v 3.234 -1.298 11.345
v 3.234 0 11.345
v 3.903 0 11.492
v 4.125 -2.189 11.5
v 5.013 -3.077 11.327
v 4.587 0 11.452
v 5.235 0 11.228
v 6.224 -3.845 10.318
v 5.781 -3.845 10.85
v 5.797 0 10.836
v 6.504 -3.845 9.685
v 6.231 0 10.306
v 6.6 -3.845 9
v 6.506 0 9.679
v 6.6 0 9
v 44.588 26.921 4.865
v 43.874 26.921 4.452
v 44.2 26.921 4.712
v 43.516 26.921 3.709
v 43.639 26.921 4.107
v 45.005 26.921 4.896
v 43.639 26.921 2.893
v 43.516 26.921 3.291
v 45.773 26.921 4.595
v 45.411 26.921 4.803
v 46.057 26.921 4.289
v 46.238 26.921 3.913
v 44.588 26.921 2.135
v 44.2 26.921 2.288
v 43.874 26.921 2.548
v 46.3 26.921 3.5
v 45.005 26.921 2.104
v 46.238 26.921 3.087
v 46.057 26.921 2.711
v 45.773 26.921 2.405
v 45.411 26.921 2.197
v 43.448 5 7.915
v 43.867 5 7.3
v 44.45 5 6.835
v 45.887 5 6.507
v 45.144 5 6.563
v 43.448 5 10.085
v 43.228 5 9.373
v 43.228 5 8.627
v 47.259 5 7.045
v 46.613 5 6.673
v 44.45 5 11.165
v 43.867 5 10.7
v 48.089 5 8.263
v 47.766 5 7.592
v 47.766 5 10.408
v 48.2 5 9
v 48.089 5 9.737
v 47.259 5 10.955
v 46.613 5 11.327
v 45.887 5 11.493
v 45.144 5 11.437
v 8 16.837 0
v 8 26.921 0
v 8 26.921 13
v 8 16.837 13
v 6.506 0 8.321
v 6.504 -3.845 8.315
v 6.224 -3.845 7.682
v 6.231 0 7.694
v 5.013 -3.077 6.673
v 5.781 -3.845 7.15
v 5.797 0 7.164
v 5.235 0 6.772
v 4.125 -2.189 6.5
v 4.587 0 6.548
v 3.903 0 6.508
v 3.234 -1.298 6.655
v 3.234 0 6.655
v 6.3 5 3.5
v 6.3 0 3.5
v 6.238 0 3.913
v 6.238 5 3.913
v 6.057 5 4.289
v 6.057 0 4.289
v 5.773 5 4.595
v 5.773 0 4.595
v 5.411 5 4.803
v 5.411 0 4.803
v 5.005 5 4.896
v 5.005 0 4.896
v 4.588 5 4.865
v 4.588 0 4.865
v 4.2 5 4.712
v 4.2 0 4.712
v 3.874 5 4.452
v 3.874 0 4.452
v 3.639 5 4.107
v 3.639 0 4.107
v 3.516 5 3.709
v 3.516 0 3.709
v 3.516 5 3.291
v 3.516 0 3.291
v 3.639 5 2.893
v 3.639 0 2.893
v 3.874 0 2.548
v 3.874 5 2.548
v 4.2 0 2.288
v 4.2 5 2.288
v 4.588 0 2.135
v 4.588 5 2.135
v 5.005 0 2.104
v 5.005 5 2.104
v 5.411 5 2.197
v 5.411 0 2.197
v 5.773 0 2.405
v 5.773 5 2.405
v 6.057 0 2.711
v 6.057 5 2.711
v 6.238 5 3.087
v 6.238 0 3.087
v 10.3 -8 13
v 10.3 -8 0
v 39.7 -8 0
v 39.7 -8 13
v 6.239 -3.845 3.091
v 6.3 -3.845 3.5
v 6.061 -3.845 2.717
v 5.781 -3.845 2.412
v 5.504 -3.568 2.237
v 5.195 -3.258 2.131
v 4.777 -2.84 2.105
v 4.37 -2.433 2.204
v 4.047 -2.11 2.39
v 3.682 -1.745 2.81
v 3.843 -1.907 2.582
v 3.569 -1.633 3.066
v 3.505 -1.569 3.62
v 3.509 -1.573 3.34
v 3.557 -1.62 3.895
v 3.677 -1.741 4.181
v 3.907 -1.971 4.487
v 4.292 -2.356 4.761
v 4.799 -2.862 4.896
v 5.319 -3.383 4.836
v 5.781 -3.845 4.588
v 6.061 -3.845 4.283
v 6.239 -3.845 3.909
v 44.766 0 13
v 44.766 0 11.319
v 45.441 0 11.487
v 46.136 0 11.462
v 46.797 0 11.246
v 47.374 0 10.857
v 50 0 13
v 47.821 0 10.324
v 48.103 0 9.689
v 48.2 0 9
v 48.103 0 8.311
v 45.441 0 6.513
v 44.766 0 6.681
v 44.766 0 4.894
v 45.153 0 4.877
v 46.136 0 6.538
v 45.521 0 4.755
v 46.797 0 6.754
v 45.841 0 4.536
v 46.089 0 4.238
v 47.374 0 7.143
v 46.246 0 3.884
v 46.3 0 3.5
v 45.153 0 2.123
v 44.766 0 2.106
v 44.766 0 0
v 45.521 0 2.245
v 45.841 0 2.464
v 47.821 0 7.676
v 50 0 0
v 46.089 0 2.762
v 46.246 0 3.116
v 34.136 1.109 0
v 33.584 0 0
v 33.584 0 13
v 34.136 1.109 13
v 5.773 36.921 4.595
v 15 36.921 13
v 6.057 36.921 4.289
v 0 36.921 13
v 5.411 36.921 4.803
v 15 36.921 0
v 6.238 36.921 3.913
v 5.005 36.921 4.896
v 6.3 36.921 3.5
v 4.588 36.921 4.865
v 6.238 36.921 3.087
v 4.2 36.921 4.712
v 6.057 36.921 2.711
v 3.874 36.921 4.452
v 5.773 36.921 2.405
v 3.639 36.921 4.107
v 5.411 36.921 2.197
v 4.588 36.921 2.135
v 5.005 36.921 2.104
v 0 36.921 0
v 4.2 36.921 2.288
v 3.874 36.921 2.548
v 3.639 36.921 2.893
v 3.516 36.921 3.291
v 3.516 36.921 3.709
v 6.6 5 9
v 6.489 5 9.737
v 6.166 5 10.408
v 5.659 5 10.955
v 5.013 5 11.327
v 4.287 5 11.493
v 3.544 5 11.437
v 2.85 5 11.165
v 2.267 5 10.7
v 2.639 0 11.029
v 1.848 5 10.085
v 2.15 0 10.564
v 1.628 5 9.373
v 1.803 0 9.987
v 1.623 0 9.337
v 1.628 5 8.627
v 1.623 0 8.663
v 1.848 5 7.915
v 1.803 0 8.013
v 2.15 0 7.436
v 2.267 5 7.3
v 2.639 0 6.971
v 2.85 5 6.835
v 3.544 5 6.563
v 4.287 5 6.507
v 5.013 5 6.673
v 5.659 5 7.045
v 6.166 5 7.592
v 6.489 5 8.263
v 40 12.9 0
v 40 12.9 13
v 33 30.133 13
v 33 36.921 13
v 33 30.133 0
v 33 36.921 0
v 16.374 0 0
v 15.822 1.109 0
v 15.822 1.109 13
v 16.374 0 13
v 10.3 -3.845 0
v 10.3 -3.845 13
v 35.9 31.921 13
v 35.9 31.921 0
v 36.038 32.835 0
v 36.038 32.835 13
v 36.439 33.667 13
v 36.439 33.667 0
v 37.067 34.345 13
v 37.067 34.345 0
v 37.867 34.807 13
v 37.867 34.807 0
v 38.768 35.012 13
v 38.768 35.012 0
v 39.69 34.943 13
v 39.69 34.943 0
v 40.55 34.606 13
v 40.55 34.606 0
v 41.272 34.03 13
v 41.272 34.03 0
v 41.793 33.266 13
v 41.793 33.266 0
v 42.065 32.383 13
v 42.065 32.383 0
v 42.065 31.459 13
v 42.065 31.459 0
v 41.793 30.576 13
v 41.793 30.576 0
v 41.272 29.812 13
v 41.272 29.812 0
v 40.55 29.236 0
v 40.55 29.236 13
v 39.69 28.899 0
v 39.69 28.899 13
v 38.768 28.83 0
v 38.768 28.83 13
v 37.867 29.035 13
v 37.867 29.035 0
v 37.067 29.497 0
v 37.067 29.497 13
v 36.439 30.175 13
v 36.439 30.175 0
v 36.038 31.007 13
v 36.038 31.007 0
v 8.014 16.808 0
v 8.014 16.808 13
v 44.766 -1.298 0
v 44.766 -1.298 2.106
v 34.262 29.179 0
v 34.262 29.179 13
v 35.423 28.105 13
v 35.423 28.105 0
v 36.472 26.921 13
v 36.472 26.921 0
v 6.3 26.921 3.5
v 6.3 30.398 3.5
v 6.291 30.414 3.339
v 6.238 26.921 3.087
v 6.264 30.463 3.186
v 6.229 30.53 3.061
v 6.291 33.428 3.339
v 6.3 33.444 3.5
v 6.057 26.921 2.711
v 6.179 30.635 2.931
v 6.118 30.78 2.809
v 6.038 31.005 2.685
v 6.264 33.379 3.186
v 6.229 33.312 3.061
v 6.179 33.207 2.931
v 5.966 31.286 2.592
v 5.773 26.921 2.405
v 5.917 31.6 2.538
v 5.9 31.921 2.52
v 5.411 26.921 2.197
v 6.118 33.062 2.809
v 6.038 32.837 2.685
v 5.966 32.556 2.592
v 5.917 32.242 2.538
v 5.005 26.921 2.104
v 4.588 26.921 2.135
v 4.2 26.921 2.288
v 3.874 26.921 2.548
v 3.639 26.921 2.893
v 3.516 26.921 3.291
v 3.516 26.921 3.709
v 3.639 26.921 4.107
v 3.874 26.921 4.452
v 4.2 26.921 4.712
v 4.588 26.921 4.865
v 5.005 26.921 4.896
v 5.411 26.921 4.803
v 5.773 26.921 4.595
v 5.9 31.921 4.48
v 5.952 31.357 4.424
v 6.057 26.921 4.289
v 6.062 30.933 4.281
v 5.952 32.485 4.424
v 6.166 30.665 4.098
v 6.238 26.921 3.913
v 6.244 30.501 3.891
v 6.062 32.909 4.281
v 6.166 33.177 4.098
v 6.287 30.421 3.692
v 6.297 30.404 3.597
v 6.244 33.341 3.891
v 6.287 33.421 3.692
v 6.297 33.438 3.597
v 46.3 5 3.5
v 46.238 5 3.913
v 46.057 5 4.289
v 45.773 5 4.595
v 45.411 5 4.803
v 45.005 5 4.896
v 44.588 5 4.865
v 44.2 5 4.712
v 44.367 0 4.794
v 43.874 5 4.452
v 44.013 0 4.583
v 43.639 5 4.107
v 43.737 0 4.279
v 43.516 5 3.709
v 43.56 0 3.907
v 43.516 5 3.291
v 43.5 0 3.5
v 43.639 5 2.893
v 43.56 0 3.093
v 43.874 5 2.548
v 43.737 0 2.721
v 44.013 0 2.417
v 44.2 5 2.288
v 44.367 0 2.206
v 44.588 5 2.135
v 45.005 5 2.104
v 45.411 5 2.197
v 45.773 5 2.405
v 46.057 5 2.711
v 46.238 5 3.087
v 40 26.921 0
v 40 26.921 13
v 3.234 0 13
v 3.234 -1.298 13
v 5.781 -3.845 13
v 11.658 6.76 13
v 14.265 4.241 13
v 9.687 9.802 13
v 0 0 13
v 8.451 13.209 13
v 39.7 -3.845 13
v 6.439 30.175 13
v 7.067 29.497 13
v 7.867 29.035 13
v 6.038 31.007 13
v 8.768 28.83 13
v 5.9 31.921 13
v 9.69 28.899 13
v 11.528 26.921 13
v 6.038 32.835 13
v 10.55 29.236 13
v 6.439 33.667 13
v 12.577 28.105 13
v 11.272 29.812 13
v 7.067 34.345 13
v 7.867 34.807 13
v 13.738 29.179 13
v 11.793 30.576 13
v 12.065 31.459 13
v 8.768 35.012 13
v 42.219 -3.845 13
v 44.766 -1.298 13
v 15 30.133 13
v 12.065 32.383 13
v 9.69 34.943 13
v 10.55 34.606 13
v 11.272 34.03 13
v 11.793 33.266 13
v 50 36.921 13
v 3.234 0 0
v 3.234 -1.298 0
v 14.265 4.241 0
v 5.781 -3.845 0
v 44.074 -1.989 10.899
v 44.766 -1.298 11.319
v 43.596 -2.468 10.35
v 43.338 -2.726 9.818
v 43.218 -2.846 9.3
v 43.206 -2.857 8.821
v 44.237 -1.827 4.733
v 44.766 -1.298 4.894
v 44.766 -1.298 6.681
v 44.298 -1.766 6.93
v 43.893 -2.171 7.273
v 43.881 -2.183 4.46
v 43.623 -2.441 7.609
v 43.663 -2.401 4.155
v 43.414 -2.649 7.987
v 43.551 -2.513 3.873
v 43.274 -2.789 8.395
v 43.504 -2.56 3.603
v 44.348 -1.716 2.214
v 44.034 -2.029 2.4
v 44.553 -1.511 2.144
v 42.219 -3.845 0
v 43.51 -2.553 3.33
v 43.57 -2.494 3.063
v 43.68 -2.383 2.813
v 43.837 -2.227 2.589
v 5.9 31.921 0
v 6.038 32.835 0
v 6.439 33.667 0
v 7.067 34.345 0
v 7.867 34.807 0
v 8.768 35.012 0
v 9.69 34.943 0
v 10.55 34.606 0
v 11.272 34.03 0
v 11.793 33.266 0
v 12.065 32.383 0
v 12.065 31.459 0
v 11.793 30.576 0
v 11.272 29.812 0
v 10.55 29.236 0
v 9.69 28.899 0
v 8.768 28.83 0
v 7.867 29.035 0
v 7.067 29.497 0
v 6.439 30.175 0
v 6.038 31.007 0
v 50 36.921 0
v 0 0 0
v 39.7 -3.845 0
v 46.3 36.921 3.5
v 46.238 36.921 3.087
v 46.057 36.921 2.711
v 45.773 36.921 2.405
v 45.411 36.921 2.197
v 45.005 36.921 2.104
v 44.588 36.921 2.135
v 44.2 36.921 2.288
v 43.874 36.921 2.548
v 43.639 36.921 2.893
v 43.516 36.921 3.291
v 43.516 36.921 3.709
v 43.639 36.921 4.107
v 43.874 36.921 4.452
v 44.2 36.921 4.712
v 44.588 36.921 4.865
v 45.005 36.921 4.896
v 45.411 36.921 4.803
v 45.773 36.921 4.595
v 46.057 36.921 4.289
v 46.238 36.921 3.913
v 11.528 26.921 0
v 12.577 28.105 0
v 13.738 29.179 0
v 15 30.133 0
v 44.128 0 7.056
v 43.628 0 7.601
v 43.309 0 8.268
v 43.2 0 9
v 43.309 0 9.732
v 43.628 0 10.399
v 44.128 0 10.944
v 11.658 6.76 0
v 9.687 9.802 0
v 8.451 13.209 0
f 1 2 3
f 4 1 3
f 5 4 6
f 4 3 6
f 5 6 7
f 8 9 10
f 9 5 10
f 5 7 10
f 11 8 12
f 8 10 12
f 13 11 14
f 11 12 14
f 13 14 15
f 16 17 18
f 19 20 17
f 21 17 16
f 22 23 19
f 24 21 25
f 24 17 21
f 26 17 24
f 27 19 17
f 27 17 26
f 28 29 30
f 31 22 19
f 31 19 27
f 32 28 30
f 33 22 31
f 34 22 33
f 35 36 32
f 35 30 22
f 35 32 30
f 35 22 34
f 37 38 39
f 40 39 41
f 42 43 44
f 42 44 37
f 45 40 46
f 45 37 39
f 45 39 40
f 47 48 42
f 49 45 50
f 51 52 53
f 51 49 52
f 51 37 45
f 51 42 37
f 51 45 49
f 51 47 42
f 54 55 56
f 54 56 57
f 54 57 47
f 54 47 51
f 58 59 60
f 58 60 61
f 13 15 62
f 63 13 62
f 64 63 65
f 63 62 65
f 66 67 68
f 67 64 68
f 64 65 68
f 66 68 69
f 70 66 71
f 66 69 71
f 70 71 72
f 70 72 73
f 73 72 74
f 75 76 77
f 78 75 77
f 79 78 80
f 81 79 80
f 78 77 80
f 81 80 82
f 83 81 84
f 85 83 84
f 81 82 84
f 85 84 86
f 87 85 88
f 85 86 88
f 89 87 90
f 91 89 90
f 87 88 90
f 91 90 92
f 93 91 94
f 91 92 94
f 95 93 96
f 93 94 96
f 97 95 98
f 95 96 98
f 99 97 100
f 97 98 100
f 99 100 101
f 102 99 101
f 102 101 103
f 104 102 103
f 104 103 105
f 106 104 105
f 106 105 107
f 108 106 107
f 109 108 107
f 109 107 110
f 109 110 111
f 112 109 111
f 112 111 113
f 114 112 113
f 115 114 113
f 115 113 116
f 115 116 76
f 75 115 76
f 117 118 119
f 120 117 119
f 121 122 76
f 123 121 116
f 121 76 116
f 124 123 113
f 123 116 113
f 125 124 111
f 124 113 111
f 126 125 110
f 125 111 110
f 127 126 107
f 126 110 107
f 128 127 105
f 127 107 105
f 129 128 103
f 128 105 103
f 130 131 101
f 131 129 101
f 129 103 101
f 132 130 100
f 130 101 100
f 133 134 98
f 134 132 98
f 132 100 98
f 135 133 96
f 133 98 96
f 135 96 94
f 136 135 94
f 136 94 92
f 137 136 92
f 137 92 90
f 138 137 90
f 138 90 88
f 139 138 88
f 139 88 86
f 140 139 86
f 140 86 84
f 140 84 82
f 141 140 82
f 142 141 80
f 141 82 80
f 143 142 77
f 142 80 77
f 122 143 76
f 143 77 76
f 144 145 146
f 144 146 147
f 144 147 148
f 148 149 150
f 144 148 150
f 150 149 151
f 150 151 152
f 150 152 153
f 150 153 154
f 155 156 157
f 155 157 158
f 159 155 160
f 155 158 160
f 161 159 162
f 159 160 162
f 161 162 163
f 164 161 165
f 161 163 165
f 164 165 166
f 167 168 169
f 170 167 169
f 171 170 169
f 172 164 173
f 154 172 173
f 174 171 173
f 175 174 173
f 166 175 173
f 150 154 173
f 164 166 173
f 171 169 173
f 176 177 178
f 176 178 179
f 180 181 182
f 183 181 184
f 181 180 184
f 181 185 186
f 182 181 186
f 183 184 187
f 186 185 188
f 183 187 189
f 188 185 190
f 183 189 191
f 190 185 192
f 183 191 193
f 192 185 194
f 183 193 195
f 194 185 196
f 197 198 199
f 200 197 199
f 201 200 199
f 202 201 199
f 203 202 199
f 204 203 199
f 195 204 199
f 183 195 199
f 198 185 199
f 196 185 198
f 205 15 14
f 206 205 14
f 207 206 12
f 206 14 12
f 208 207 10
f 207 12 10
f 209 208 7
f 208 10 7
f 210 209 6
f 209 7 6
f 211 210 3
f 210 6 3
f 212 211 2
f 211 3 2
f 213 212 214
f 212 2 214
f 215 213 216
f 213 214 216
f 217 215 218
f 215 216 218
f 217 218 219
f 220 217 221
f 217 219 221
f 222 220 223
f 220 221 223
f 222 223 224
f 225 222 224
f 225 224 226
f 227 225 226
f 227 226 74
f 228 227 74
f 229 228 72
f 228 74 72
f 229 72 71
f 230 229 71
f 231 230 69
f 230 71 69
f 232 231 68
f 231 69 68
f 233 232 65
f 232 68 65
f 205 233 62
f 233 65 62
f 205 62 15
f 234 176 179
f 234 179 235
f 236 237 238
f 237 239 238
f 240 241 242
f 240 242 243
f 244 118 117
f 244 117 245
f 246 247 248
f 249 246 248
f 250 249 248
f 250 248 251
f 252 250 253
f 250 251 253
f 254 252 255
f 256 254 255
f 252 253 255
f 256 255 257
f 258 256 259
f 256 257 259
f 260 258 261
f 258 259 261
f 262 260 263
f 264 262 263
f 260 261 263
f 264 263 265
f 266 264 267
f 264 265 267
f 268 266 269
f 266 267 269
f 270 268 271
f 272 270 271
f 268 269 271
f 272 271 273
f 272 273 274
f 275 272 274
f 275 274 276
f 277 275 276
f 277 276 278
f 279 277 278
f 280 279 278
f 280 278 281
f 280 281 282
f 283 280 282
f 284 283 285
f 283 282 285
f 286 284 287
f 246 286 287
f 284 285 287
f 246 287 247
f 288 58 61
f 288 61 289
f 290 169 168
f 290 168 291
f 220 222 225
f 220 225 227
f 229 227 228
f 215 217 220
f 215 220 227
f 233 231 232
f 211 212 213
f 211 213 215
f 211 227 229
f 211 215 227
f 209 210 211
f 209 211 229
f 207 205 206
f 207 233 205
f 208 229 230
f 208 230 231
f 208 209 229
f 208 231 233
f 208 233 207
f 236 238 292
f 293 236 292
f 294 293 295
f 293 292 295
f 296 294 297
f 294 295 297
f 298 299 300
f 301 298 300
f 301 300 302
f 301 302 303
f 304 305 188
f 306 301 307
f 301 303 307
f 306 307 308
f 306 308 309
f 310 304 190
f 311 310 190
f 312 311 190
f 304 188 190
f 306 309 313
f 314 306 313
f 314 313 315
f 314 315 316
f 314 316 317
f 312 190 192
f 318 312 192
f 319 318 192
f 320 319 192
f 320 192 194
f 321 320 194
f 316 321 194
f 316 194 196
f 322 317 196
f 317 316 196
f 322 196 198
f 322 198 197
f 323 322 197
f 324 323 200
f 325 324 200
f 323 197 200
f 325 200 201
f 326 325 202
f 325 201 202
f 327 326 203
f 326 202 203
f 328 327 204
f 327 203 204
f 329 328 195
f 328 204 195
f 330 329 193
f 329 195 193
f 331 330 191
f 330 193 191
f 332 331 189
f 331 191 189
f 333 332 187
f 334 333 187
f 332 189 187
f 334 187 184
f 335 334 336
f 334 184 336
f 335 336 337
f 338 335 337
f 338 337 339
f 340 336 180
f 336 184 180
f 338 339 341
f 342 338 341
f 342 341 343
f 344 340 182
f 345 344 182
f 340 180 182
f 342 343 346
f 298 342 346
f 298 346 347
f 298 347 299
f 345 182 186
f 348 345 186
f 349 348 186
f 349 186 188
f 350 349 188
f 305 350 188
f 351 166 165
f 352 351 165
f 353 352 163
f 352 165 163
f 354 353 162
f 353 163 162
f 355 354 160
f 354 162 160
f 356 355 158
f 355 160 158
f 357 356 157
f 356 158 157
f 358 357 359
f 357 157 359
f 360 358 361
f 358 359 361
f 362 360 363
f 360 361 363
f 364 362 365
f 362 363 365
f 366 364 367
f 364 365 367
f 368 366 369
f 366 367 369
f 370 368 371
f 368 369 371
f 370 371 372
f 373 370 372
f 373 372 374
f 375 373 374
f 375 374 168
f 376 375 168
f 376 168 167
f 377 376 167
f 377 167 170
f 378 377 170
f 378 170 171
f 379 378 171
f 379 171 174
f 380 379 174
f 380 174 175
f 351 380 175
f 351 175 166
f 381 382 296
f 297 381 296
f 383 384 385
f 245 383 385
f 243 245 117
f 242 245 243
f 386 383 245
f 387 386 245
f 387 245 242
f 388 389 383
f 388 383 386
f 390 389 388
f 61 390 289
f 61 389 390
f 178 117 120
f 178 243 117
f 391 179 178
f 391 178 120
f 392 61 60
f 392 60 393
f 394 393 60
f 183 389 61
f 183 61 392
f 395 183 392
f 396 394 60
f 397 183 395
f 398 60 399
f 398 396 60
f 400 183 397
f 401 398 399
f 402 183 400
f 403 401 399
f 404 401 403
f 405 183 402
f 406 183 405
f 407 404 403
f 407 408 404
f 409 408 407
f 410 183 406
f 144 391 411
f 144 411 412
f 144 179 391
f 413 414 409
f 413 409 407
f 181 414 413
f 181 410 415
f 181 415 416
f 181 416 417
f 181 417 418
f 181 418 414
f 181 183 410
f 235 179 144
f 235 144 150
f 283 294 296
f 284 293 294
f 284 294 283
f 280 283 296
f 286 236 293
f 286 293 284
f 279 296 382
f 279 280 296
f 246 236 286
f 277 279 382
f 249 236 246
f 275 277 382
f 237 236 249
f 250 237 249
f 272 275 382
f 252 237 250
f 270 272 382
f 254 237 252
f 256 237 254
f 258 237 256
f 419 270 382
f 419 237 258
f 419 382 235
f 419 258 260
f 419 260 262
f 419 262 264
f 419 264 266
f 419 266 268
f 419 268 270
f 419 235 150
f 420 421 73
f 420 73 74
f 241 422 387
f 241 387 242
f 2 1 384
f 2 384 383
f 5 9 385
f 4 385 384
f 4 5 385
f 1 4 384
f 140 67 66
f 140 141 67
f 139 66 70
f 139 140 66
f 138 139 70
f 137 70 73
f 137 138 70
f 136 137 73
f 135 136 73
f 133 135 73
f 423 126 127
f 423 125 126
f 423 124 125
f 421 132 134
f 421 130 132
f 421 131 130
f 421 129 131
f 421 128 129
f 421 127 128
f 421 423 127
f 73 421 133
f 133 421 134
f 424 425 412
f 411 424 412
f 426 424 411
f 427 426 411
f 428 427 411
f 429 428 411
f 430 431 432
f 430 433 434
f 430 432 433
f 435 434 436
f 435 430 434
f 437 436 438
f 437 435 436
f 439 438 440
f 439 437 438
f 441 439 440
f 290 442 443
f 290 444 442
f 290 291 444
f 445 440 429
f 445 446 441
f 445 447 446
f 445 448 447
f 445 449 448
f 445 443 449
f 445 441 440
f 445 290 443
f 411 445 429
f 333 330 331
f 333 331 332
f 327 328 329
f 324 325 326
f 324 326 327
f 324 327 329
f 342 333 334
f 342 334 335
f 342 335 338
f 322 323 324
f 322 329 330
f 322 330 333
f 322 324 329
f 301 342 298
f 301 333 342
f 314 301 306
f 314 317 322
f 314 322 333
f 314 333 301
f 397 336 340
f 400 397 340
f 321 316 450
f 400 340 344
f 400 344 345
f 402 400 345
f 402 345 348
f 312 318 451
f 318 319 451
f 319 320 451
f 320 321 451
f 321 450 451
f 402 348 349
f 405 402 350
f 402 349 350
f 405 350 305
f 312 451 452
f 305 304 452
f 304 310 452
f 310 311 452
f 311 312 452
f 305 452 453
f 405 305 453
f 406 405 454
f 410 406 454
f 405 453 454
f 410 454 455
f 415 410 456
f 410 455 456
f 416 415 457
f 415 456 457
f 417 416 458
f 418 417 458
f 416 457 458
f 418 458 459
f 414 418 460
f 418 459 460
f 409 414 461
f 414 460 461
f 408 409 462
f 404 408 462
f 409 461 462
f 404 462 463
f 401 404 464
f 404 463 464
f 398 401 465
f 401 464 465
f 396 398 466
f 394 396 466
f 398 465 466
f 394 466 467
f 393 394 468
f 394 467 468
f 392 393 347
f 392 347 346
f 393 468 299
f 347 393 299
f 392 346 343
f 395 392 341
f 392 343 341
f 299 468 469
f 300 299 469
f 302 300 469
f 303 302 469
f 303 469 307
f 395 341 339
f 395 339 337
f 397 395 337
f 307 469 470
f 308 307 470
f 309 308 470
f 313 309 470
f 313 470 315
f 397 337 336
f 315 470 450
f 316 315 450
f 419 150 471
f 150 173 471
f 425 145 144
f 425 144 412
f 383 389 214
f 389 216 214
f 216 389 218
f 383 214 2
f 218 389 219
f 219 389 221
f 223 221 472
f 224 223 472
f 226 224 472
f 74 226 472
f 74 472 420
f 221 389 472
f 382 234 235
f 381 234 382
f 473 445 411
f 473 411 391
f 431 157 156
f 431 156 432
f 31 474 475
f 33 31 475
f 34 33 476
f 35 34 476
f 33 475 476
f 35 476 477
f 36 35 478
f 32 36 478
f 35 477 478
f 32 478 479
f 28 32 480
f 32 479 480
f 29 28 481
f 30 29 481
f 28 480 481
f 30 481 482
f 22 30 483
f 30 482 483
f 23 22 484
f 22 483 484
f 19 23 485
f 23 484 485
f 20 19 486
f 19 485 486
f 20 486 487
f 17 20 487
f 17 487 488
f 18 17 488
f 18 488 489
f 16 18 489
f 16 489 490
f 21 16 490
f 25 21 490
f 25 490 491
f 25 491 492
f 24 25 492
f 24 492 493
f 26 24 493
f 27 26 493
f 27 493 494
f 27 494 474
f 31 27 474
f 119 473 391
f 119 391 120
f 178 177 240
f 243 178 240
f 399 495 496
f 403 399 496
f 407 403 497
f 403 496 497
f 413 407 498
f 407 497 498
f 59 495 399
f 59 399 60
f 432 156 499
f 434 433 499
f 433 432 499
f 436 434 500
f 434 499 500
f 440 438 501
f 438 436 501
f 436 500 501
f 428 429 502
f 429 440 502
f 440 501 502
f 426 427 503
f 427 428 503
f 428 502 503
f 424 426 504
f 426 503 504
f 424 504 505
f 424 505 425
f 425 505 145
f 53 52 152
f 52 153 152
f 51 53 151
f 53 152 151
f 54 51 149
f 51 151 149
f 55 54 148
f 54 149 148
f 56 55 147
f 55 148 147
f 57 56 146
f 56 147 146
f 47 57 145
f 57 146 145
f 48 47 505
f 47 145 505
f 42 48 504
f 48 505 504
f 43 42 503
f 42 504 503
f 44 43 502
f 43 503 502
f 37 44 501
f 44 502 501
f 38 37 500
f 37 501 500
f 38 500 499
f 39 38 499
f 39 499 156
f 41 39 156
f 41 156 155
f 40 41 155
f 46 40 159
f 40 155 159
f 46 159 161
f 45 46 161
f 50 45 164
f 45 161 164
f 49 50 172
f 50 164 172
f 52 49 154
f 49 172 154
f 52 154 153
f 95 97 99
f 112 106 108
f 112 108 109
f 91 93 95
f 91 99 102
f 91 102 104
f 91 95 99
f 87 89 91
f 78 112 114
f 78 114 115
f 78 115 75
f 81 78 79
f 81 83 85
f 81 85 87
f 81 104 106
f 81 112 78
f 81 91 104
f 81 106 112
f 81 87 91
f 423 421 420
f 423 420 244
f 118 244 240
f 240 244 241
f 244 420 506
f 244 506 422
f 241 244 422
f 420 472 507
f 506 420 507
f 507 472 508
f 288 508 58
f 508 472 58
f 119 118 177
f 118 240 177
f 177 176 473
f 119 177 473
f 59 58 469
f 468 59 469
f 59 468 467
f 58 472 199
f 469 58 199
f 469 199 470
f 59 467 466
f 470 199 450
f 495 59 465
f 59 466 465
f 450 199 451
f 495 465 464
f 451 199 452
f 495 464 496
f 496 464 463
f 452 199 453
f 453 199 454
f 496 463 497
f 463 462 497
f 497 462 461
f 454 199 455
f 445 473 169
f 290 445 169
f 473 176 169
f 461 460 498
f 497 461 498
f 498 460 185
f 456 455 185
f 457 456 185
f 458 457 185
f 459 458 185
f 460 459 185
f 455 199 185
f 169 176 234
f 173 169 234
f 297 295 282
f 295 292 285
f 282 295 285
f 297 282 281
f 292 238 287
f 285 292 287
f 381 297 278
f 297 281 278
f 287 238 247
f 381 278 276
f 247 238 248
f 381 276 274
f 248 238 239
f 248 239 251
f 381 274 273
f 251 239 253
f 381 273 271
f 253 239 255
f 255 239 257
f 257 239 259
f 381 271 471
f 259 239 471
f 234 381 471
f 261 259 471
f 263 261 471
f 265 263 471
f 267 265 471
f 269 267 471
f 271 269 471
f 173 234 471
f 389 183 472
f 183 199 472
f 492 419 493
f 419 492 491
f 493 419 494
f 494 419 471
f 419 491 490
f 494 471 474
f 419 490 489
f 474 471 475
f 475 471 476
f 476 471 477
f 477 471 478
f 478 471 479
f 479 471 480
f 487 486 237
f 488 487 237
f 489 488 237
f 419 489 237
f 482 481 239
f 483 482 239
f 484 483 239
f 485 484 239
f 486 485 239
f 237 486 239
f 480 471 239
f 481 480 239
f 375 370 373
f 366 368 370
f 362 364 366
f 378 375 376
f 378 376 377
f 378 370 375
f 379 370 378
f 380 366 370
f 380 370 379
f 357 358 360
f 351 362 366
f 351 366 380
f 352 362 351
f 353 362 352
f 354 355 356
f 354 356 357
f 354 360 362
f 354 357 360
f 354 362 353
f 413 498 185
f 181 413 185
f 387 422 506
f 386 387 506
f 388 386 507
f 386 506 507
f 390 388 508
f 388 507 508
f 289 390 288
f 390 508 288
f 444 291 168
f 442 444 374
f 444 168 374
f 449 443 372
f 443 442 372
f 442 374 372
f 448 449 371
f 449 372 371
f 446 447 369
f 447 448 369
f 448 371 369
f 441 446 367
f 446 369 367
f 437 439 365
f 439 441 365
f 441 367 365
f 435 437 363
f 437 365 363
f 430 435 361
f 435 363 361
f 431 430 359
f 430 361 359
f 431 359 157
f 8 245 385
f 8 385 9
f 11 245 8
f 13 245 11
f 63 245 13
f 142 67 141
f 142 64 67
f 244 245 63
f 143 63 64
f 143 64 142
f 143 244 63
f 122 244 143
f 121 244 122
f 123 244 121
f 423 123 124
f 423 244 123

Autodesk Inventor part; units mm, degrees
ref_plane "YZ Plane" through (0, 0, 0) normal (1, 0, 0) x (0, 1, 0)
ref_plane "XZ Plane" through (0, 0, 0) normal (0, 1, 0) x (-1, 0, 0)
ref_plane "XY Plane" through (0, 0, 0) normal (0, 0, 1) x (1, 0, 0)
sketch "Sketch1" plane through (0, 0, 0) normal (0, 0, 1) x (1, 0, 0)
  line L0 (0, 0) -> (50, 0)
  line L1 (50, 0) -> (50, 36.921)
  line L2 (50, 36.921) -> (0, 36.921)
  line L3 (0, 36.921) -> (0, 0)
  dimension "d0" = 36.921
  dimension "d1" = 50
extrude "Extrusion1" add sketch "Sketch1" along normal blind 13
sketch "Sketch4" plane through (0, 0, 0) normal (0, 0, -1) x (-1, 0, 0)
  line L0 (-10, -8) -> (-40, -8)
  line L1 (-45.066, 0) -> (-2.934, 0)
  line L2 (-10.3, -8) -> (-10.3, -3.845)
  line L3 (-10.3, -3.845) -> (-5.7813, -3.845)
  line L4 (-5.7813, -3.845) -> (-3.234, -1.2977)
  line L5 (-3.234, -1.2977) -> (-3.234, 0)
  line L6 (-44.766, 0) -> (-44.766, -1.2977)
  line L7 (-44.766, -1.2977) -> (-42.2187, -3.845)
  line L8 (-42.2187, -3.845) -> (-39.7, -3.845)
  line L9 (-39.7, -3.845) -> (-39.7, -8)
  line L10 (0, 0) -> (-2.934, 0)
  line L11 (0, 0) -> (-50, 0) projected
  point P0 (-45.066, -1.422)
  dimension "d27" = 2.934
extrude "Extrusion4" add sketch "Sketch4" against normal blind 13
sketch "Sketch2" plane through (0, 0, 0) normal (0, -1, 0) x (1, 0, 0)
  circle A0 centre (44.9, 3.5) radius 1.4
  circle A1 centre (4.9, 3.5) radius 1.4
  line L0 (50, 0) -> (50, 13) projected
  circle A2 centre (45.7, 9) radius 2.5
  circle A3 centre (4.1, 9) radius 2.5
  line L1 (0, 0) -> (0, 13) projected
  line L2 (0, 13) -> (50, 13) projected
  dimension "d4" = 2.8
  dimension "d5" = 2.8
  dimension "d7" = 40
  dimension "d8" = 5
  dimension "d9" = 5
  dimension "d10" = 5.5
  dimension "d13" = 4.1
  dimension "d14" = 5.5
  dimension "d15" = 4
  dimension "d16" = 4.9
  dimension "d17" = 41.6
  dimension "d20" = 4
extrude "Extrusion2" cut sketch "Sketch2" along normal blind 10 and the other way blind 5
sketch "Sketch7" plane through (0, 0, 0) normal (0, 0, -1) x (-1, 0, 0)
  arc A0 (17, 30.1329) -> (13.5279, 26.921) centre (26, 16.921) ccw
  line L0 (10, 26.921) -> (13.5279, 26.921)
  line L1 (10, 12.8998) -> (10, 26.921)
  line L2 (15.8642, 1.1093) -> (10, 12.8998)
  line L3 (16.416, 0) -> (33.6258, 0)
  line L4 (16.416, 0) -> (15.8642, 1.1093)
  line L5 (34.1776, 1.1093) -> (33.6258, 0)
  line L6 (35.7354, 4.2414) -> (34.1776, 1.1093)
  arc A1 (35.7354, 4.2414) -> (41.9856, 16.8076) centre (26, 16.921) ccw
  line L7 (42, 26.921) -> (42, 16.8366)
  line L8 (38.4721, 26.921) -> (42, 26.921)
  arc A2 (38.4721, 26.921) -> (35, 30.1328) centre (26, 16.921) ccw
  line L9 (35, 36.921) -> (35, 30.1328)
  line L10 (17, 30.1329) -> (17, 36.921)
  circle A3 centre (11, 31.921) radius 3.1
  circle A4 centre (41, 31.921) radius 3.1
  line L11 (42, 16.8366) -> (41.9856, 16.8076)
  line L12 (17, 36.921) -> (35, 36.921)
  line L13 (17, 35.9386) -> (35, 35.9386)
  line L14 (35, 35.9386) -> (35, 37.4386)
  line L15 (35, 37.4386) -> (17, 37.4386)
  line L16 (17, 37.4386) -> (17, 35.9386)
  line L17 (0, 36.921) -> (0, 0) projected
  line L18 (0, 36.921) -> (-15, 36.921)
  line L19 (0, 36.921) -> (15, 36.921) construction
  line L20 (-33, 35.9386) -> (-15, 35.9386)
  line L21 (-33, 36.921) -> (-15, 36.921)
  line L22 (-15, 37.4386) -> (-33, 37.4386)
  line L23 (-33, 37.4386) -> (-33, 35.9386)
  line L24 (-33, 30.1329) -> (-33, 36.921)
  arc A5 (-33, 30.1329) -> (-36.4721, 26.921) centre (-24, 16.921) ccw
  circle A6 centre (-39, 31.921) radius 3.1
  line L25 (-40, 26.921) -> (-36.4721, 26.921)
  line L26 (-40, 12.8998) -> (-40, 26.921)
  line L27 (-34.1358, 1.1093) -> (-40, 12.8998)
  line L28 (-33.584, 0) -> (-16.3742, 0)
  line L29 (-33.584, 0) -> (-34.1358, 1.1093)
  line L30 (-8, 16.8366) -> (-8.0144, 16.8076)
  arc A7 (-14.2646, 4.2414) -> (-8.0144, 16.8076) centre (-24, 16.921) ccw
  line L31 (-14.2646, 4.2414) -> (-15.8224, 1.1093)
  line L32 (-15.8224, 1.1093) -> (-16.3742, 0)
  line L33 (-8, 26.921) -> (-8, 16.8366)
  line L34 (-15, 35.9386) -> (-15, 37.4386)
  arc A8 (-11.5279, 26.921) -> (-15, 30.1328) centre (-24, 16.921) ccw
  line L35 (-11.5279, 26.921) -> (-8, 26.921)
  circle A9 centre (-9, 31.921) radius 3.1
  line L36 (-15, 36.921) -> (-15, 30.1328)
  point P0 (-35, 36.921)
  dimension "d33" = 1.5
  dimension "d34" = 15
  dimension "d35" = 180
  dimension "d39" = 1.5
extrude "Extrusion7" cut sketch "Sketch7" against normal blind 13 contours L23 L21 L34 L20 | L20 L36 A8 L35 L33 L30 A7 L31 L32 L28 L29 L27 L26 L25 A5 L24 | L23 L22 L34 L21 | A6 | A9
sketch "Sketch8" plane through (0, 36.921, 13) normal (0, 1, 0) x (1, 0, 0)
  circle A0 centre (4.9, 9.5) radius 1.4 projected
  circle A1 centre (44.9, 9.5) radius 1.4 projected
  point P0 (0, 13)
extrude "Extrusion8" cut sketch "Sketch8" against normal blind 10
properties part number "30_CUBE_openSIM_Rodholder"
